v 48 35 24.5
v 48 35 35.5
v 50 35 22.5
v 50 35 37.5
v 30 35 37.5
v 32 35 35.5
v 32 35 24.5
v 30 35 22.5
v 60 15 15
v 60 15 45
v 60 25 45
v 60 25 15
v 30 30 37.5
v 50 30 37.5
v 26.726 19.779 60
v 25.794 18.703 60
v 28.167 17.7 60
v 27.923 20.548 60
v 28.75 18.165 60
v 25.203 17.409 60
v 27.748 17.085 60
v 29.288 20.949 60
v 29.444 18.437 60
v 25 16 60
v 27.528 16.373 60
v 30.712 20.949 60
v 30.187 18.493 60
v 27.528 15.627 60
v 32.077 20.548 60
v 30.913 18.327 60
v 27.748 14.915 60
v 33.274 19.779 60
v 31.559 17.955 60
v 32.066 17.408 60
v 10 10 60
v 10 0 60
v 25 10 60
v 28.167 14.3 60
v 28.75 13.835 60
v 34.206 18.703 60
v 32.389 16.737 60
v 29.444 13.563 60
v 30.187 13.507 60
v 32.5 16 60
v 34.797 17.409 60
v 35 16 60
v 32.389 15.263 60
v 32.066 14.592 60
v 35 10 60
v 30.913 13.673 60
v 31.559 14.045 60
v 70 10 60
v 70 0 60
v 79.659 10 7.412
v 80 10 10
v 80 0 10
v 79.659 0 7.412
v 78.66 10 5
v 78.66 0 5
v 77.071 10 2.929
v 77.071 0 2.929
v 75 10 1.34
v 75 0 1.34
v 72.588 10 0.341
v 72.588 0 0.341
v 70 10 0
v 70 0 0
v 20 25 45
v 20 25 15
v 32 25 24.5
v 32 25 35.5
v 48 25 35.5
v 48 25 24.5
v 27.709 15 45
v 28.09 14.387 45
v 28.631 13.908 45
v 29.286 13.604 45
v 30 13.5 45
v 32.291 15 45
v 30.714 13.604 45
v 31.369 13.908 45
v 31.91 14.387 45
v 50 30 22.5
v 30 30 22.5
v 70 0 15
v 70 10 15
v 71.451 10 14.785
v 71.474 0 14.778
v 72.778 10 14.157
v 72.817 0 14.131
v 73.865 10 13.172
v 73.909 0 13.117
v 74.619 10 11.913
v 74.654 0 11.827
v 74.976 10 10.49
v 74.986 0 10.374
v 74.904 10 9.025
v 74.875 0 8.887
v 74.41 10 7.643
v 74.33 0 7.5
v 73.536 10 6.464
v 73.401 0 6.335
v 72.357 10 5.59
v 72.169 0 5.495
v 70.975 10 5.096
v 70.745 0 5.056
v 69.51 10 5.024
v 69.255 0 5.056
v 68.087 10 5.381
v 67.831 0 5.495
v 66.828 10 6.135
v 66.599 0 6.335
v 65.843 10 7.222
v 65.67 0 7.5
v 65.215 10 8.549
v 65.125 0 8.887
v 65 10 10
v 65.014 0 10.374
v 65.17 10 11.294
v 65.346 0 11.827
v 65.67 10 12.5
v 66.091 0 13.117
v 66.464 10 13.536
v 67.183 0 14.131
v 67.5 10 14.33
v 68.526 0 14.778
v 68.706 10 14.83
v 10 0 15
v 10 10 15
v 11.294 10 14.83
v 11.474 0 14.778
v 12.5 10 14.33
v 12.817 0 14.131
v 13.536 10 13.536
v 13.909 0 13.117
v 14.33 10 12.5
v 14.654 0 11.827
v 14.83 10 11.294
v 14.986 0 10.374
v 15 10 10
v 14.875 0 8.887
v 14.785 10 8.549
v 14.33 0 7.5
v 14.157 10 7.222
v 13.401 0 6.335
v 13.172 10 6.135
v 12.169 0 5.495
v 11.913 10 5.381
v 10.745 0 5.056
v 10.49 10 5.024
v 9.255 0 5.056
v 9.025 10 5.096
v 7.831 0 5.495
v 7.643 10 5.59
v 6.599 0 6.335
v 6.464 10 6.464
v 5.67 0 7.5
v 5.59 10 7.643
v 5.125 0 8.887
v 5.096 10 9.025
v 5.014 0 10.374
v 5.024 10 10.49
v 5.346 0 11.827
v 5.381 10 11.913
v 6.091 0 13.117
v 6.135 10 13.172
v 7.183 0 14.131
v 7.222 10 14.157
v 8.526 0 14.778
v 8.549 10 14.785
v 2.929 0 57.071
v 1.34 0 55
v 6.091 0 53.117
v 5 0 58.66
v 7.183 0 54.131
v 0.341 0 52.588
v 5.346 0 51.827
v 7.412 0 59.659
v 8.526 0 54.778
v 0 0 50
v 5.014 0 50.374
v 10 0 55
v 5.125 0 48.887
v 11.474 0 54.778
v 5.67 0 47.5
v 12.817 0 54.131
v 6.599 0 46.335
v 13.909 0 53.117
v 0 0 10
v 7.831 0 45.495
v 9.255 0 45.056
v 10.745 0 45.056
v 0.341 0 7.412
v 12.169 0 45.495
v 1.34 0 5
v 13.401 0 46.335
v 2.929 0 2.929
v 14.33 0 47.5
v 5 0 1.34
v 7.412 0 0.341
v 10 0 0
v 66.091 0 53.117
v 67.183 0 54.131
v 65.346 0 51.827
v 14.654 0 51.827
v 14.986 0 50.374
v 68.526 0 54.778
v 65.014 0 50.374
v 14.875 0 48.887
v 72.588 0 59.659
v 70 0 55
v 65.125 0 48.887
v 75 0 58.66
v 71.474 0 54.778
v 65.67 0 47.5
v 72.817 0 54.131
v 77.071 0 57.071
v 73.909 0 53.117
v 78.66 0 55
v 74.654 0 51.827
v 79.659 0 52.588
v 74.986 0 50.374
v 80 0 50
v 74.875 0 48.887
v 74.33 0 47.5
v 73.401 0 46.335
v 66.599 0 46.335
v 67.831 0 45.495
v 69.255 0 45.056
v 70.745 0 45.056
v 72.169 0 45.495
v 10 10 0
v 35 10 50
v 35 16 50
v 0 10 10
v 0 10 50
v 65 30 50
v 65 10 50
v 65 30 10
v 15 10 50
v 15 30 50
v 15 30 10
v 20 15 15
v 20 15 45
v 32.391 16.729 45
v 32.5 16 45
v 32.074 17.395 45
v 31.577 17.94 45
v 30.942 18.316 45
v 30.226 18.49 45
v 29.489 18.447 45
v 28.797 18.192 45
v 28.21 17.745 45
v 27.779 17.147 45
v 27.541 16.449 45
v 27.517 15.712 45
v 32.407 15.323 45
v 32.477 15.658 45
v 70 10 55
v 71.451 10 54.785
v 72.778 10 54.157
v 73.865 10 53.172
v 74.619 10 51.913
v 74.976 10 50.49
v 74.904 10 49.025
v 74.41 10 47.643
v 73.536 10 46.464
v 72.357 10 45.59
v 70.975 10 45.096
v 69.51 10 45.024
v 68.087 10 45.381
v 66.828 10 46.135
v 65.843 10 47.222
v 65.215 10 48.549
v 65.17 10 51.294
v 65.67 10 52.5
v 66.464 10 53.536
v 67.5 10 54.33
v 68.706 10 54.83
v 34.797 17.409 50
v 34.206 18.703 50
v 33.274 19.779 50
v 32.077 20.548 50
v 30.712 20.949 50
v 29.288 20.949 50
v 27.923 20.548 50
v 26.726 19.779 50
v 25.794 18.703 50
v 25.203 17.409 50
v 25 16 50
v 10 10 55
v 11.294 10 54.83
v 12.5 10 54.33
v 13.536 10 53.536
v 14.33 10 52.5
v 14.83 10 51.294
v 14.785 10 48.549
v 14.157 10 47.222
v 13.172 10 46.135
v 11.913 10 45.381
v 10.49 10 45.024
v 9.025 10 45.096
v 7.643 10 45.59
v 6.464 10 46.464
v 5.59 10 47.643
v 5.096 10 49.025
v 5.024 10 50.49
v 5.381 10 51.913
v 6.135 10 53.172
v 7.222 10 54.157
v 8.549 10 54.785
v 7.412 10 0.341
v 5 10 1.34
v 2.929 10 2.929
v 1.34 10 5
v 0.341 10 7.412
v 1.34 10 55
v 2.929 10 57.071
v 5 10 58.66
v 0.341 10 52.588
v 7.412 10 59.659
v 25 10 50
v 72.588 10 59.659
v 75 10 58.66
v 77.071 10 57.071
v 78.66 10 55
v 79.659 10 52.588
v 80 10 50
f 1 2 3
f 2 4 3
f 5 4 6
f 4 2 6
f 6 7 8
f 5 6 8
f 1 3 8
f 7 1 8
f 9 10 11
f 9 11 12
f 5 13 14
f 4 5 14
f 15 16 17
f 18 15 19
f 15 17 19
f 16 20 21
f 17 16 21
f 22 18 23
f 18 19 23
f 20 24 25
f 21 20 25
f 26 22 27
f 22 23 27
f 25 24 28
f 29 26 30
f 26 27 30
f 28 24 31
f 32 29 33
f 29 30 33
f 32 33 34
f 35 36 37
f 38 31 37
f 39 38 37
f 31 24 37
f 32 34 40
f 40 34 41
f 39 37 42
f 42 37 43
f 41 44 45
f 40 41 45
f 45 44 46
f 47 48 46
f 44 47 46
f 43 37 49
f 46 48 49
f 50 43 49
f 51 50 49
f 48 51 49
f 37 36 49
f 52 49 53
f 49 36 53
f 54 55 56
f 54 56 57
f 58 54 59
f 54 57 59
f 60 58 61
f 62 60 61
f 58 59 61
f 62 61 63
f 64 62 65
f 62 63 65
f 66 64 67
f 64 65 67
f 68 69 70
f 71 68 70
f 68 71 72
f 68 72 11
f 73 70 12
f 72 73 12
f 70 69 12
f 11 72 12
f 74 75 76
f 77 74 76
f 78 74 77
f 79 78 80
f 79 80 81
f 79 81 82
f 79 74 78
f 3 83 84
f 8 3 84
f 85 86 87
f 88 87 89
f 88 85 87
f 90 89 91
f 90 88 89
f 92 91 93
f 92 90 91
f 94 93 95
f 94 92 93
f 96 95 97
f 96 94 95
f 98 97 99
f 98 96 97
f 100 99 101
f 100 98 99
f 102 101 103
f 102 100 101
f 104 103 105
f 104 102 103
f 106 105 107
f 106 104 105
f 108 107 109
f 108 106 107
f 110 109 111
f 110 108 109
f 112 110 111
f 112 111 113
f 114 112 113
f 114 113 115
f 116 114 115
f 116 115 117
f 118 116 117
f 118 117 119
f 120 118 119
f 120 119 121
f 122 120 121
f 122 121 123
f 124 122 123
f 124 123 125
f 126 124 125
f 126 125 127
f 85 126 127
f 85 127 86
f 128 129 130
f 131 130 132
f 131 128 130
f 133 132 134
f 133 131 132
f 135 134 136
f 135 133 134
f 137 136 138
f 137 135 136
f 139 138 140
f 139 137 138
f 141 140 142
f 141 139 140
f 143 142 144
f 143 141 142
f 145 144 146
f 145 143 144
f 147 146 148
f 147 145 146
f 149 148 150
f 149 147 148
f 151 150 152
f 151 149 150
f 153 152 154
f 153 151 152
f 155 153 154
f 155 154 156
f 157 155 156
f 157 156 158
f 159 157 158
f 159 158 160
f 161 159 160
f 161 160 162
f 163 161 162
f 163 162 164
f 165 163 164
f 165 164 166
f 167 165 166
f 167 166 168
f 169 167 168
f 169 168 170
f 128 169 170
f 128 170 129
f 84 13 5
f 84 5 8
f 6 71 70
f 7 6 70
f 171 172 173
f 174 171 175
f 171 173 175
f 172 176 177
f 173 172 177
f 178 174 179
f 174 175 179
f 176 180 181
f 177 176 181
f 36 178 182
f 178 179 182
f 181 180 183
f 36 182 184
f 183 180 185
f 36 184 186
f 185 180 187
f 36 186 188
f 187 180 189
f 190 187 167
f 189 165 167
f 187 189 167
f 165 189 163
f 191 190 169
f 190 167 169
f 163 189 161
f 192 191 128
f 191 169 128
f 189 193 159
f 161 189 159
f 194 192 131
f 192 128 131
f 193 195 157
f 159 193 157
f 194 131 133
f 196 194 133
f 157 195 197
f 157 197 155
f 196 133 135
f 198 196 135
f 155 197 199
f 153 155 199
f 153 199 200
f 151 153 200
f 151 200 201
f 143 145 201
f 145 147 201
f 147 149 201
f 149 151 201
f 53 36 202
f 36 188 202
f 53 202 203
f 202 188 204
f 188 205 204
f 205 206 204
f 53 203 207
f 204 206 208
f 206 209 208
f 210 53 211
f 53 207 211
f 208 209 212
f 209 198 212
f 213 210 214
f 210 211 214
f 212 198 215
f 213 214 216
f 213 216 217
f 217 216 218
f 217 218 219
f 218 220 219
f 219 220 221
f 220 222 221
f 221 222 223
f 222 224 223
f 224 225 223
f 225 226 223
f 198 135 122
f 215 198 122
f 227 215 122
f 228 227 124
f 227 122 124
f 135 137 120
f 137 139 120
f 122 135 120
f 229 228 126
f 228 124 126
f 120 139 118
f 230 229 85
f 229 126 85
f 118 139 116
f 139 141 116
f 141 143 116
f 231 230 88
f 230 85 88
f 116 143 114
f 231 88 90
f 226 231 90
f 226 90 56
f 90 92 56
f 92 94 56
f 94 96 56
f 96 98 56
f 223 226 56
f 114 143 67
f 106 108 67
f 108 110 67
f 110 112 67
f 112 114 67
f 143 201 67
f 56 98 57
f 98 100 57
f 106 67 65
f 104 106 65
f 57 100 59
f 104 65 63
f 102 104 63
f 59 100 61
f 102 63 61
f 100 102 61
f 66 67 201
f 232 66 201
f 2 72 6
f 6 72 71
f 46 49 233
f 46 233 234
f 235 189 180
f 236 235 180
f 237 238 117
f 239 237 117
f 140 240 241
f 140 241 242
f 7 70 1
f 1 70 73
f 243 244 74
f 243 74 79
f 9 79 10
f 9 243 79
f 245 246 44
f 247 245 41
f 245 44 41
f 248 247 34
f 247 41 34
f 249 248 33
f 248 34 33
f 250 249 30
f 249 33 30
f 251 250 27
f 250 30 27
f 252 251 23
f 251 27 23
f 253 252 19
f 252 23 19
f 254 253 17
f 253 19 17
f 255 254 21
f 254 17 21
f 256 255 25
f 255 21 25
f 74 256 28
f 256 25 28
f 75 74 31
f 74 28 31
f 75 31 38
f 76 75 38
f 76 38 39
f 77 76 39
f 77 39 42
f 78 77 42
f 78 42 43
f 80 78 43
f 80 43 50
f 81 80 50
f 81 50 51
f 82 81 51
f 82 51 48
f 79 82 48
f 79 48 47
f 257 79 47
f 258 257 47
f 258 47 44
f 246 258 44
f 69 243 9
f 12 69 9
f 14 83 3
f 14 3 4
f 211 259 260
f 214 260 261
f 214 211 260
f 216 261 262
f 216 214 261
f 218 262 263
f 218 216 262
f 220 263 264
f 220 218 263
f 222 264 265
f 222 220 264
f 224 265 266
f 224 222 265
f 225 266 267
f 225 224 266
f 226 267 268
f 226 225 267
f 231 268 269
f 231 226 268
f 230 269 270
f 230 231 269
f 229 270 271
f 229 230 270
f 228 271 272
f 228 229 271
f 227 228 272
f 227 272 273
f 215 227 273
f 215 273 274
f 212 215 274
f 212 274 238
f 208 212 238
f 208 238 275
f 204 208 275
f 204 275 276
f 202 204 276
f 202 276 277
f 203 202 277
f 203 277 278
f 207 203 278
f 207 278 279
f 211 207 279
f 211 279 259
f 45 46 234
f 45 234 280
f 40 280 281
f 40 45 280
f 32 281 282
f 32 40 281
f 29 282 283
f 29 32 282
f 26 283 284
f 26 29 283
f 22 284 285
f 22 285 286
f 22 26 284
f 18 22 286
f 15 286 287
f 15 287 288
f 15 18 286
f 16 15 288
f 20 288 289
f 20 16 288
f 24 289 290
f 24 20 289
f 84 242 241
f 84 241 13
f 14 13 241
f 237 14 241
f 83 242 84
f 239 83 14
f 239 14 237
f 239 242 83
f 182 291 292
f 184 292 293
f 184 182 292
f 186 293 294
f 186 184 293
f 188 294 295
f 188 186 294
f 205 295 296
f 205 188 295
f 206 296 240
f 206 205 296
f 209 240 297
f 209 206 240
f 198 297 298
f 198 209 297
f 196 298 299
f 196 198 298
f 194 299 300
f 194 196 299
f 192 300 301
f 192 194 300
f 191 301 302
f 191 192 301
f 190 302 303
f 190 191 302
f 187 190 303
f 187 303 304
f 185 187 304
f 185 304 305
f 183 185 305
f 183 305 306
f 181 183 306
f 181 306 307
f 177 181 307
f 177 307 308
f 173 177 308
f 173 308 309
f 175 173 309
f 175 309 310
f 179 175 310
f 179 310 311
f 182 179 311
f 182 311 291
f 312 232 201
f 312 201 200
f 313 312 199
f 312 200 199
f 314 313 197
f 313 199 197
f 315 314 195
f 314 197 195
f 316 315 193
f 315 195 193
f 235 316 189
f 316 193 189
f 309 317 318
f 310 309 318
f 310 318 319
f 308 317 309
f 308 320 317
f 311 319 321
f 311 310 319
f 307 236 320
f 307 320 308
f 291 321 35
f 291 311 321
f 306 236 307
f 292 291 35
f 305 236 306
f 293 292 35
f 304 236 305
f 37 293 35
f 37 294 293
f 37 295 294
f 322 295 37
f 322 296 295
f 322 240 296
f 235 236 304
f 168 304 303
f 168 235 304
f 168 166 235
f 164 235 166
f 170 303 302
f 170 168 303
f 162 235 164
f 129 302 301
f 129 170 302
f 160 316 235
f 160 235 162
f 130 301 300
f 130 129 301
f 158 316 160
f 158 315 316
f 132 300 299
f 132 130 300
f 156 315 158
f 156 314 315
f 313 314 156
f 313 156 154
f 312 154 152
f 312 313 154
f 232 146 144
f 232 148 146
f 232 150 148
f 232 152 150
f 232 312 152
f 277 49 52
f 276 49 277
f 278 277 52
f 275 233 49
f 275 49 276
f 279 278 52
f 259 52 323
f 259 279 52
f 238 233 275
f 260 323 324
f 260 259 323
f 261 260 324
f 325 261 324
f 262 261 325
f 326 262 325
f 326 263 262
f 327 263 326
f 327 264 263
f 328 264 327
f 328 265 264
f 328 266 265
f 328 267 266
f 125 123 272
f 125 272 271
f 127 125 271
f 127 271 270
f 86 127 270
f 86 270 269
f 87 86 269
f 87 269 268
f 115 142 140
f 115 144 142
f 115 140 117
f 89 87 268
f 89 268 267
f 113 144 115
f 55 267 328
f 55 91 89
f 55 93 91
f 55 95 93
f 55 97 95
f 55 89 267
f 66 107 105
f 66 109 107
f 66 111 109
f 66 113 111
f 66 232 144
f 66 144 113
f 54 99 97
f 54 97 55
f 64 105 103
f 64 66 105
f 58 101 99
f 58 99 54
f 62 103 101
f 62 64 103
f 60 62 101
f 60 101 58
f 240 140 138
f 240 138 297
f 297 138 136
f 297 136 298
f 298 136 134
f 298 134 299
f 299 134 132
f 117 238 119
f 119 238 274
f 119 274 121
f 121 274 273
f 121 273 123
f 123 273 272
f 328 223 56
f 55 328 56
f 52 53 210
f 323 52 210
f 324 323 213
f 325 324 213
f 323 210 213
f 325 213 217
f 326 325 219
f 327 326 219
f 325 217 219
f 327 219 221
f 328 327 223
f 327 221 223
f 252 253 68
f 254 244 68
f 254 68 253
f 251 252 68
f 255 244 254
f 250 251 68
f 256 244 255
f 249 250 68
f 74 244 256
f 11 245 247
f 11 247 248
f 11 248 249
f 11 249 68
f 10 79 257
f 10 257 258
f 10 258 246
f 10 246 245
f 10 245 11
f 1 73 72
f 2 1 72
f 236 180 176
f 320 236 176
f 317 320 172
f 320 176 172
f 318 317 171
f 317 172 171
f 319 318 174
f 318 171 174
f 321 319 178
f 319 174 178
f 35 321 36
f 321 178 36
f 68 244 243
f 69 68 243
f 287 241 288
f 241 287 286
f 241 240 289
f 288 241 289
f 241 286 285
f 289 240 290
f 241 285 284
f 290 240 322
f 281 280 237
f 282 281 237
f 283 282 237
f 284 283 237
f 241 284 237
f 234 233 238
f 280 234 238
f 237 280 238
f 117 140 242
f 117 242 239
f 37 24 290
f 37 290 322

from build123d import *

# Parameters (mm, degrees)
SKETCH_1_R            = 10
SKETCH_1_R_2          = 5
EXTRUDE_2_DEPTH       = 10
SKETCH_3_R            = 2.5
EXTRUDE_4_DEPTH       = 10
EXTRUDE_1_OUTLINE_W   = 50
EXTRUDE_1_OUTLINE_H   = 40
EXTRUDE_1_OUTLINE_W_2 = 40
EXTRUDE_1_OUTLINE_H_2 = 30
EXTRUDE_1_DEPTH       = 20
EXTRUDE_1_2_OUTLINE_W = 40
EXTRUDE_1_2_OUTLINE_H = 30
EXTRUDE_1_2_DEPTH     = 5
EXTRUDE_START         = 15
EXTRUDE_1_3_OUTLINE_W = 40
EXTRUDE_1_3_OUTLINE_H = 30
EXTRUDE_1_3_DEPTH     = 5
EXTRUDE_2_2_DEPTH     = 5
SKETCH_15_R           = 2.5
CUT_EXTRUDE_3_DEPTH   = 15
SKETCH_20_W           = 16
SKETCH_20_H           = 11
CUT_EXTRUDE_7_DEPTH   = 10


# Read off the part's stored shape, not the designer's step: 拉伸-薄壁1
with BuildPart() as part:
    # 草图1 → Extrude 2 (new body)
    # profile 1 of 7: a face of its own
    with BuildSketch(Plane(origin=(0, 0, 0), x_dir=(1, 0, 0), z_dir=(0, 1, 0))):
        with BuildLine():
            Line((70, 0), (40, 0))
            Line((40, 0), (40, -30))
            Line((40, -30), (40, -60))
            Line((40, -60), (70, -60))
            ThreePointArc((70, -60), (62.928932188, -42.928932188), (80, -50))
            Line((80, -50), (80, -10))
            ThreePointArc((80, -10), (62.928932188, -17.071067812), (70, 0))
        make_face()
    # profile 2 of 7: a face of its own
    with BuildSketch(Plane(origin=(0, 0, 0), x_dir=(1, 0, 0), z_dir=(0, 1, 0))):
        with BuildLine():
            Line((40, -30), (40, 0))
            Line((40, 0), (10, 0))
            ThreePointArc((10, 0), (17.071067812, -2.928932188), (20, -10))
            ThreePointArc((20, -10), (10, -20), (0, -10))
            Line((0, -10), (0, -30))
            Line((0, -30), (40, -30))
        make_face()
    # profile 3 of 7: a face of its own
    with BuildSketch(Plane(origin=(0, 0, 0), x_dir=(1, 0, 0), z_dir=(0, 1, 0))):
        with BuildLine():
            Line((40, -60), (40, -30))
            Line((40, -30), (0, -30))
            Line((0, -30), (0, -50))
            ThreePointArc((0, -50), (10, -40), (20, -50))
            ThreePointArc((20, -50), (17.071067812, -57.071067812), (10, -60))
            Line((10, -60), (40, -60))
        make_face()
    # profile 4 of 7: a face of its own
    with BuildSketch(Plane(origin=(0, 0, 0), x_dir=(1, 0, 0), z_dir=(0, 1, 0))):
        with Locations((10, -50)):
            Circle(SKETCH_1_R)
        with Locations(Location((10, -50, 0), (0, 0, 270))):
            Circle(SKETCH_1_R_2, mode=Mode.SUBTRACT)
    # profile 5 of 7: a face of its own
    with BuildSketch(Plane(origin=(0, 0, 0), x_dir=(1, 0, 0), z_dir=(0, 1, 0))):
        with Locations((70, -50)):
            Circle(SKETCH_1_R)
        with Locations(Location((70, -50, 0), (0, 0, 270))):
            Circle(SKETCH_1_R_2, mode=Mode.SUBTRACT)
    # profile 6 of 7: a face of its own
    with BuildSketch(Plane(origin=(0, 0, 0), x_dir=(1, 0, 0), z_dir=(0, 1, 0))):
        with Locations((70, -10)):
            Circle(SKETCH_1_R)
        with Locations(Location((70, -10, 0), (0, 0, 270))):
            Circle(SKETCH_1_R_2, mode=Mode.SUBTRACT)
    # profile 7 of 7: a face of its own
    with BuildSketch(Plane(origin=(0, 0, 0), x_dir=(1, 0, 0), z_dir=(0, 1, 0))):
        with Locations((10, -10)):
            Circle(SKETCH_1_R)
        with Locations(Location((10, -10, 0), (0, 0, 270))):
            Circle(SKETCH_1_R_2, mode=Mode.SUBTRACT)
    extrude(amount=EXTRUDE_2_DEPTH)

    # 草图3 → 凸台-拉伸4 (add)
    with BuildSketch(Plane.XY.offset(60)):
        with BuildLine():
            Line((25, 16), (25, 10))
            Line((25, 10), (35, 10))
            Line((35, 10), (35, 16))
            ThreePointArc((35, 16), (30, 21), (25, 16))
        make_face()
        with Locations((30, 16)):
            Circle(SKETCH_3_R, mode=Mode.SUBTRACT)
    extrude(amount=-EXTRUDE_4_DEPTH)

    # 拉伸-薄壁1 outline → 拉伸-薄壁1 (add)
    with BuildSketch(Plane(origin=(0, 10, 0), x_dir=(1, 0, 0), z_dir=(0, 1, 0))):
        with Locations((40, -30)):
            Rectangle(EXTRUDE_1_OUTLINE_W, EXTRUDE_1_OUTLINE_H)
        with Locations((40, -30)):
            Rectangle(EXTRUDE_1_OUTLINE_W_2, EXTRUDE_1_OUTLINE_H_2, mode=Mode.SUBTRACT)
    extrude(amount=EXTRUDE_1_DEPTH)

    # Extrude 1 2 outline → Extrude 1 2 (add)
    with BuildSketch(Plane(origin=(0, 10, 0), x_dir=(1, 0, 0), z_dir=(0, 1, 0))):
        with Locations((40, -30)):
            Rectangle(EXTRUDE_1_2_OUTLINE_W, EXTRUDE_1_2_OUTLINE_H)
    extrude(amount=EXTRUDE_1_2_DEPTH)

    # Extrude 1 3 outline → Extrude 1 3 (add)
    with BuildSketch(Plane(origin=(0, 10, 0), x_dir=(1, 0, 0), z_dir=(0, 1, 0)).offset(EXTRUDE_START)):
        with Locations((40, -30)):
            Rectangle(EXTRUDE_1_3_OUTLINE_W, EXTRUDE_1_3_OUTLINE_H)
    extrude(amount=EXTRUDE_1_3_DEPTH)

    # 草图14 → Extrude 2 2 (add)
    with BuildSketch(Plane(origin=(0, 30, 0), x_dir=(1, 0, 0), z_dir=(0, 1, 0))):
        Polygon((30, -37.5), (30, -22.5), (40, -22.5), (50, -22.5), (50, -37.5), (40, -37.5), align=None)
        Polygon((32, -35.5), (32, -24.5), (40, -24.5), (48, -24.5), (48, -35.5), (40, -35.5), align=None, mode=Mode.SUBTRACT)
    extrude(amount=EXTRUDE_2_2_DEPTH)

    # 草图15 → 切除-拉伸3 (cut)
    with BuildSketch(Plane.XY.offset(60)):
        with Locations((30, 16)):
            Circle(SKETCH_15_R)
    extrude(amount=-CUT_EXTRUDE_3_DEPTH, mode=Mode.SUBTRACT)

    # 草图20 → 切除-拉伸7 (cut)
    with BuildSketch(Plane(origin=(0, 30, 0), x_dir=(1, 0, 0), z_dir=(0, 1, 0))):
        with Locations((40, -30)):
            Rectangle(SKETCH_20_W, SKETCH_20_H)
    extrude(amount=-CUT_EXTRUDE_7_DEPTH, mode=Mode.SUBTRACT)


solid = part.part
